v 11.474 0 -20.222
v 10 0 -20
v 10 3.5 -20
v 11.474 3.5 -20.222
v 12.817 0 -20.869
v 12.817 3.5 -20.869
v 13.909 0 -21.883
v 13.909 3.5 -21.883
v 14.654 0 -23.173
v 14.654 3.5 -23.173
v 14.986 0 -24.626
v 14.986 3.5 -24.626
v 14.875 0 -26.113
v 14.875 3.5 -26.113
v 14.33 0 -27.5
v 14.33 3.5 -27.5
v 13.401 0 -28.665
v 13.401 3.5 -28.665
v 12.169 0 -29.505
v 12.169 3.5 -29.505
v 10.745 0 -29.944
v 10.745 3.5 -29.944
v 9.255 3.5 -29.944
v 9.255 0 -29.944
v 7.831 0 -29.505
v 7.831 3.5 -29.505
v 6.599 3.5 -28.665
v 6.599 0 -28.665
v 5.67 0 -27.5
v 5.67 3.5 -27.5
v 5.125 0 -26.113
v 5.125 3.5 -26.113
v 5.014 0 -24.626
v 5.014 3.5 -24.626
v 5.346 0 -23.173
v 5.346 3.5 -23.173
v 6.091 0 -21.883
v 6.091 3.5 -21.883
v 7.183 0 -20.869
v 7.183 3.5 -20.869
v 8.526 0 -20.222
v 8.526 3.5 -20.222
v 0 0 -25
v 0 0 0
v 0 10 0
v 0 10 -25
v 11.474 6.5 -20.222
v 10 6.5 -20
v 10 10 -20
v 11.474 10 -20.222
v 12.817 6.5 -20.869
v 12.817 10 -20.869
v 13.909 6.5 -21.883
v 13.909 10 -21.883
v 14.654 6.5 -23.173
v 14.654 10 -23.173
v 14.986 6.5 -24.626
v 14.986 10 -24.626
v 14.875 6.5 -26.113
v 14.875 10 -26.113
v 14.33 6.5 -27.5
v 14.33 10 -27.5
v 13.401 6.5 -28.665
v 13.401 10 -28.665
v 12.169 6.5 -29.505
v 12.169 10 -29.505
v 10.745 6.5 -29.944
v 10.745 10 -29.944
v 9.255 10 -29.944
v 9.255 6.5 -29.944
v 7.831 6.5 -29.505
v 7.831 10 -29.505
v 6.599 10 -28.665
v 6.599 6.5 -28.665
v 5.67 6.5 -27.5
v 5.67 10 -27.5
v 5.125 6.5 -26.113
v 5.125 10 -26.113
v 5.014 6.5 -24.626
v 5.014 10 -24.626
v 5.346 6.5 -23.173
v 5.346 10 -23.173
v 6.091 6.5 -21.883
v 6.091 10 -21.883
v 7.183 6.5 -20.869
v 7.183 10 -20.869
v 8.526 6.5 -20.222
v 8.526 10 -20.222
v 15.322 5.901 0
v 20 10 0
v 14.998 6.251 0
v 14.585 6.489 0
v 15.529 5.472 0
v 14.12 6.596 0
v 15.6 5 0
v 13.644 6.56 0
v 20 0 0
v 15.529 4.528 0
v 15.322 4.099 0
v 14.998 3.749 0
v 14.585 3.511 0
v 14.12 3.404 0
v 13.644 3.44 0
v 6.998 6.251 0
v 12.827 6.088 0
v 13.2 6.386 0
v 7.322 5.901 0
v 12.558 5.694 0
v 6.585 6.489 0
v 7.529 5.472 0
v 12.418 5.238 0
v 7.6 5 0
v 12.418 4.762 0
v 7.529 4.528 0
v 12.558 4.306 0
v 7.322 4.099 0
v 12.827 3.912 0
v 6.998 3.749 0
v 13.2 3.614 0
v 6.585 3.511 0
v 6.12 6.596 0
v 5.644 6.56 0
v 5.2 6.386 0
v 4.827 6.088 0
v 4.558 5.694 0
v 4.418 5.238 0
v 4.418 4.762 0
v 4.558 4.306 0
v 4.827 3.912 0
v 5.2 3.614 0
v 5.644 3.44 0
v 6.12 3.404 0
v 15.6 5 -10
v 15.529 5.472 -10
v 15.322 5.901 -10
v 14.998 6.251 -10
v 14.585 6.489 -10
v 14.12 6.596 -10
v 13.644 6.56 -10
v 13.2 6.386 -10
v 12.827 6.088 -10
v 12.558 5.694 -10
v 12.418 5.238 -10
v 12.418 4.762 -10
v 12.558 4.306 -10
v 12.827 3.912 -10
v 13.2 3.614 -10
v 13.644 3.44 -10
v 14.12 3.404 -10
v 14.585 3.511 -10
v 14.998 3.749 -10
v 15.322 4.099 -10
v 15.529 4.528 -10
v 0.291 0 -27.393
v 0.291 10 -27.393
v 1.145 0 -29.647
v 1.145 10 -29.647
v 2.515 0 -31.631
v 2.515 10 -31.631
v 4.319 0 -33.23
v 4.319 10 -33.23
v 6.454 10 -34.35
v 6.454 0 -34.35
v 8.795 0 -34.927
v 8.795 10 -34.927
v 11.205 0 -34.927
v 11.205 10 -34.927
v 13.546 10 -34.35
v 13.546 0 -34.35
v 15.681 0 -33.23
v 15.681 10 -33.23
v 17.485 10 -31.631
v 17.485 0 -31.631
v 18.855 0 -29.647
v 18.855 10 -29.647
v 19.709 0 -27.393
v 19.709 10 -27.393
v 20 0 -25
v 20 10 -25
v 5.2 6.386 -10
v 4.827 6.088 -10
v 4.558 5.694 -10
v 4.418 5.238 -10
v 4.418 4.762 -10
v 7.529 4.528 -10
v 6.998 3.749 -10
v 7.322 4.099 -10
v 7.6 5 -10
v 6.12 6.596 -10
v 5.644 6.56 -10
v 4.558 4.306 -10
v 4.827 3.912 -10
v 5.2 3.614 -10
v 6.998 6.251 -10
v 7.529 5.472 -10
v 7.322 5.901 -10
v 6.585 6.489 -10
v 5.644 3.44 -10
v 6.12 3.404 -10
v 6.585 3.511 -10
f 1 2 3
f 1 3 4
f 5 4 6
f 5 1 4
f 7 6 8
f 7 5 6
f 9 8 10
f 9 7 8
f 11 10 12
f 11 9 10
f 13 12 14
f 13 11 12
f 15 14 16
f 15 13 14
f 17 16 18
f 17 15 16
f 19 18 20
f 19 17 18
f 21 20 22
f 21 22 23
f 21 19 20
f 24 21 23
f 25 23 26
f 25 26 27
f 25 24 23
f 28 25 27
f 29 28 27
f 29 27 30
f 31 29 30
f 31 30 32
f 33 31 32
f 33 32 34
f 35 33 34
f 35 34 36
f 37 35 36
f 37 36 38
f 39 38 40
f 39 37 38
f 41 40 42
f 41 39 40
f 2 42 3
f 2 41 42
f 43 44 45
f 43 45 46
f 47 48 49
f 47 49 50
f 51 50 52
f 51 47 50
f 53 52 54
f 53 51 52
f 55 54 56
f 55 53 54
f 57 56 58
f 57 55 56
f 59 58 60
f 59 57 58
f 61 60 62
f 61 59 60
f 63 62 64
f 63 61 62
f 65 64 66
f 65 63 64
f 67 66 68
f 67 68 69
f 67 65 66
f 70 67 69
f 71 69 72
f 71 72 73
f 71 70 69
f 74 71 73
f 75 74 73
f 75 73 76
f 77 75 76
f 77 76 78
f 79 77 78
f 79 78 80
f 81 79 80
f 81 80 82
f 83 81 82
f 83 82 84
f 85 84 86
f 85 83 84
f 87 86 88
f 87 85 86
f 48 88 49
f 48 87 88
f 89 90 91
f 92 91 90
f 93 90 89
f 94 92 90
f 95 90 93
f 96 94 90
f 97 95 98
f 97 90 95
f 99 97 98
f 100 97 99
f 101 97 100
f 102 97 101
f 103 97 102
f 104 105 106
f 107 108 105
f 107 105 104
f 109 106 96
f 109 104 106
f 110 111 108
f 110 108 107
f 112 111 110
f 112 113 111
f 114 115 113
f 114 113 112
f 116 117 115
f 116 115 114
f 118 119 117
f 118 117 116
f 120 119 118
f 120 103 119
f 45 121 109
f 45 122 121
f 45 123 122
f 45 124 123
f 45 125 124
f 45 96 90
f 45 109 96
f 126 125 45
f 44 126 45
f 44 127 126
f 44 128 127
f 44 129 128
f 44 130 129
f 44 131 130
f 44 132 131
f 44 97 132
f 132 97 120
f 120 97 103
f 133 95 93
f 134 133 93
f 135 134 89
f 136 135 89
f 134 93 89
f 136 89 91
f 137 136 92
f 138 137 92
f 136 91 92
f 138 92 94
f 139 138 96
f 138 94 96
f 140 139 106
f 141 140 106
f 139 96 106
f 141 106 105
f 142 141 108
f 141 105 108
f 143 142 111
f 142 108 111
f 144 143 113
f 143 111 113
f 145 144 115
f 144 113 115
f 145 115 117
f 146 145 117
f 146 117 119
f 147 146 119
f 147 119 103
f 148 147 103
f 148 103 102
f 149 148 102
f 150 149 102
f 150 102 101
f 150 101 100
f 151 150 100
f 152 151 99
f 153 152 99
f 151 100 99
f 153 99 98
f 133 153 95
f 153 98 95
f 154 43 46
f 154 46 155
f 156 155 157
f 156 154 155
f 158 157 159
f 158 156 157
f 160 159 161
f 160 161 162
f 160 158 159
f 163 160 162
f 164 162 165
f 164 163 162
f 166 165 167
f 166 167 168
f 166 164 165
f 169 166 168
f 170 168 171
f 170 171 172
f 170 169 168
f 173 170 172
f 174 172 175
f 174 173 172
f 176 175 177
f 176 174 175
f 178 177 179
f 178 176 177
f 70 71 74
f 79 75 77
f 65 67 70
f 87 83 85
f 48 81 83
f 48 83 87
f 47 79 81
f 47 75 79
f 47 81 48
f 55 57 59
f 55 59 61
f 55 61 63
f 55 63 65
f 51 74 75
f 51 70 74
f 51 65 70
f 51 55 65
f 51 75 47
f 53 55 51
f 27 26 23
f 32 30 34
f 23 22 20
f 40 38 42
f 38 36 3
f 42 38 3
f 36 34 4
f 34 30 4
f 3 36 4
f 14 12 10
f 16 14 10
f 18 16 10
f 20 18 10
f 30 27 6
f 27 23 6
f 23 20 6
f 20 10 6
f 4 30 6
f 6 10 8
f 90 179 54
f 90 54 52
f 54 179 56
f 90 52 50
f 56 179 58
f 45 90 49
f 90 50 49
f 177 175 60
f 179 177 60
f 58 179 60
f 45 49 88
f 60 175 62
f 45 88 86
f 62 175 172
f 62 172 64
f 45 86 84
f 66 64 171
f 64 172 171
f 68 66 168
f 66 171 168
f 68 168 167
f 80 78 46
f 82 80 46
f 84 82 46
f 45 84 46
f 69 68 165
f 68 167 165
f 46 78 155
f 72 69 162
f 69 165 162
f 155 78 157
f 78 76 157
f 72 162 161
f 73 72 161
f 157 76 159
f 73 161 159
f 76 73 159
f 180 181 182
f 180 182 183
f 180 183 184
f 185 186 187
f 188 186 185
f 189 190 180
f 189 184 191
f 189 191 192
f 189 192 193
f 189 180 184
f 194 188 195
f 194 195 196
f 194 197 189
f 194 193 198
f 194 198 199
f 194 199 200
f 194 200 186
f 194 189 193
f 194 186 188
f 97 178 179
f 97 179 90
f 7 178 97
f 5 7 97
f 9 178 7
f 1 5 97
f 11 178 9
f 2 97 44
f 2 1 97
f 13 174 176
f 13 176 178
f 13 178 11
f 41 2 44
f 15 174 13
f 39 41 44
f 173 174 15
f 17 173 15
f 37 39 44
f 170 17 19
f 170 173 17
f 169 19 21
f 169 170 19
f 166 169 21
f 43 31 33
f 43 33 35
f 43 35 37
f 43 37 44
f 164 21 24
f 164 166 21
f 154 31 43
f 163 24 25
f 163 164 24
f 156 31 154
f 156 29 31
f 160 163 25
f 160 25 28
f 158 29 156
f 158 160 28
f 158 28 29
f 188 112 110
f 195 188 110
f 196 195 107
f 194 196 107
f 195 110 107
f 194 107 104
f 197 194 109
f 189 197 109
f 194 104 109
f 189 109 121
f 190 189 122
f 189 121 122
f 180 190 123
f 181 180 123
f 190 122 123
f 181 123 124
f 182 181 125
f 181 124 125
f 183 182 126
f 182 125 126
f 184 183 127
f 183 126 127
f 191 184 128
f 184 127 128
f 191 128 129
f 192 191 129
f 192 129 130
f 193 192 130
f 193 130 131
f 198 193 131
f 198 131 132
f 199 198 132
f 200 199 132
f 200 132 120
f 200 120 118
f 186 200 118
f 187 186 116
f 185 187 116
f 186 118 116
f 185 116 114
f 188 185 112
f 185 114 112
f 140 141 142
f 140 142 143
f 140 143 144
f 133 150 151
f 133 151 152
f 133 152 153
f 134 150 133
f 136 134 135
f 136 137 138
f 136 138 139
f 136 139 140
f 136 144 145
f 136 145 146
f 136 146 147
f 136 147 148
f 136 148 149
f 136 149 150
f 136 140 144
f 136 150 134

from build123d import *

# Parameters (mm, degrees)
EXTRUDE_1_DEPTH     = 10
SKETCH_2_R          = 5
CUT_EXTRUDE_1_DEPTH = 3.5
CUT_EXTRUDE_START   = -3.5
SKETCH_3_R          = 5
CUT_EXTRUDE_2_DEPTH = 3.5
SKETCH_4_R          = 1.6
CUT_EXTRUDE_3_DEPTH = 10


with BuildPart() as part:
    # 草图1 → 凸台-拉伸1 (new body)
    with BuildSketch(Plane(origin=(0, 0, 0), x_dir=(1, 0, 0), z_dir=(0, 1, 0))):
        with BuildLine():
            Line((0, 0), (0, 25))
            ThreePointArc((0, 25), (10, 35), (20, 25))
            Line((20, 25), (20, 0))
            Line((20, 0), (0, 0))
        make_face()
    extrude(amount=EXTRUDE_1_DEPTH)

    # 草图2 → 切除-拉伸1 (cut)
    with BuildSketch(Plane(origin=(0, 0, 0), x_dir=(1, 0, 0), z_dir=(0, 1, 0))):
        with Locations(Location((10, 25, 0), (0, 0, 270))):
            Circle(SKETCH_2_R)
    extrude(amount=CUT_EXTRUDE_1_DEPTH, mode=Mode.SUBTRACT)

    # 草图3 → 切除-拉伸2 (cut)
    with BuildSketch(Plane(origin=(0, 10, 0), x_dir=(1, 0, 0), z_dir=(0, 1, 0)).offset(CUT_EXTRUDE_START)):
        with Locations(Location((10, 25, 0), (0, 0, 270))):
            Circle(SKETCH_3_R)
    extrude(amount=CUT_EXTRUDE_2_DEPTH, mode=Mode.SUBTRACT)

    # 草图4 → 切除-拉伸3 (cut)
    with BuildSketch(Plane.XY):
        with Locations((6, 5)):
            Circle(SKETCH_4_R)
        with Locations((14, 5)):
            Circle(SKETCH_4_R)
    extrude(amount=-CUT_EXTRUDE_3_DEPTH, mode=Mode.SUBTRACT)


solid = part.part
